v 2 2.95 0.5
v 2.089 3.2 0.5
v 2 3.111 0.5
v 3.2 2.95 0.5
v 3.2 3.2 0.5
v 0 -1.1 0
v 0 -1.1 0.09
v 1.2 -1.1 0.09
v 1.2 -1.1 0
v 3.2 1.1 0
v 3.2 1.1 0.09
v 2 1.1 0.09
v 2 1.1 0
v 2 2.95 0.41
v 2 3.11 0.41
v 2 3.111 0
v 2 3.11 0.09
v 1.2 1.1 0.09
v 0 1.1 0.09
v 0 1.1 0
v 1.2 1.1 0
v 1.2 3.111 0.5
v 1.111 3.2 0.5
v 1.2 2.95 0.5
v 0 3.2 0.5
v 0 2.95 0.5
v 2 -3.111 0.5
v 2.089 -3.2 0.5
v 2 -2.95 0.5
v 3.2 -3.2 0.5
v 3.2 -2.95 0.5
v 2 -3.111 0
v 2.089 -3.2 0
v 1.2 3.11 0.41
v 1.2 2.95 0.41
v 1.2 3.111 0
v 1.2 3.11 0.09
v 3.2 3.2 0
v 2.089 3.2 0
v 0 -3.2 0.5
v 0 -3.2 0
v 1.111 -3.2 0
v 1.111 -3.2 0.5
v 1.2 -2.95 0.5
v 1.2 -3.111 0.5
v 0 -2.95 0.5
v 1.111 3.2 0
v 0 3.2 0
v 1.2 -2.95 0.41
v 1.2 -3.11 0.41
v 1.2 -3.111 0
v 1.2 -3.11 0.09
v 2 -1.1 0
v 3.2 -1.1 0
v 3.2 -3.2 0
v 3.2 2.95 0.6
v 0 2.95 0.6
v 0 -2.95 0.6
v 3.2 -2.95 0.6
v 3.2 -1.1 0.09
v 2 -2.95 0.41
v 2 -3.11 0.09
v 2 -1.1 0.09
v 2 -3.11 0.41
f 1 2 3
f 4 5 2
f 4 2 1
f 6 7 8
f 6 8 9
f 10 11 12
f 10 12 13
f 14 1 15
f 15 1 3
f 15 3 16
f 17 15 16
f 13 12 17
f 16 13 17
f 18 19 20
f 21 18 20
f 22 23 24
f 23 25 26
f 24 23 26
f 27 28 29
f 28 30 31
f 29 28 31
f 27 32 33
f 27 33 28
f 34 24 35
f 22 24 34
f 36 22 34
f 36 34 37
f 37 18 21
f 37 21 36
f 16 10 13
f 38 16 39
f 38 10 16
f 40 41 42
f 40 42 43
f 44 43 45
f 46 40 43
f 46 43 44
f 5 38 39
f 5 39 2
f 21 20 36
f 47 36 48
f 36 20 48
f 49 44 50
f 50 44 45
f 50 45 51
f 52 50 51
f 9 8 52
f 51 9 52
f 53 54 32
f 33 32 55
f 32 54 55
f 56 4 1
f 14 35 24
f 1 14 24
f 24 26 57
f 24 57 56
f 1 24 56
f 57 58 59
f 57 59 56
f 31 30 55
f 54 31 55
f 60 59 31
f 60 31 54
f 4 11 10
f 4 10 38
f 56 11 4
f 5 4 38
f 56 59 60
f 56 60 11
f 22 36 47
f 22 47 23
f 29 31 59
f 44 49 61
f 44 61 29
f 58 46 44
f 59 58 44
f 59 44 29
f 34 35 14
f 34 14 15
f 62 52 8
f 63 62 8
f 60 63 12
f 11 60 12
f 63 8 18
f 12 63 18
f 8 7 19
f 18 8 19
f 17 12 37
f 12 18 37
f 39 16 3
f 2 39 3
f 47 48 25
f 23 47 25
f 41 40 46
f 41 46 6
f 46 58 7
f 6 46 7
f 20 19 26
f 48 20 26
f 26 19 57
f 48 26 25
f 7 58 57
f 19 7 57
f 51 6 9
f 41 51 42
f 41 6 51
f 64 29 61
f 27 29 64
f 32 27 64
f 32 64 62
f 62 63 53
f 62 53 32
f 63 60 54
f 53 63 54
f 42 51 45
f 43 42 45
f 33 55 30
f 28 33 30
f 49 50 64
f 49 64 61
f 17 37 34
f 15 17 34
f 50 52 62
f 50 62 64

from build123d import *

# Parameters (mm, degrees)
SKETCH001_W  = 5.9
SKETCH001_H  = 0.19
PAD001_DEPTH = 3.2
SKETCH_W     = 6.22
SKETCH_H     = 0.32
PAD_DEPTH    = 3.2
PAD002_DEPTH = 1.2
CHAMFER_SIZE = 0.089


with BuildPart() as body001:
    # Sketch001 → Pad001 (new body)
    with BuildSketch(Plane.YZ):
        with Locations((0, 0.505)):
            Rectangle(SKETCH001_W, SKETCH001_H)
    extrude(amount=PAD001_DEPTH)


with BuildPart() as fusion002:
    # Sketch → Pad (new body)
    with BuildSketch(Plane.YZ):
        with Locations((0, 0.25)):
            Rectangle(SKETCH_W, SKETCH_H)
    extrude(amount=PAD_DEPTH)

    # Fusion002: union Body001
    add(body001.part)


with BuildPart() as body002:
    # Sketch002 → Pad002 (new body)
    with BuildSketch(Plane.YZ):
        Polygon((-2.95, 0.41), (-3.11, 0.41), (-3.11, 0.09), (-1.1, 0.09), (-1.1, 0), (-3.2, 0), (-3.2, 0.5), (-2.95, 0.5), align=None)
    extrude(amount=PAD002_DEPTH)

    # Chamfer
    chamfer_edges = [body002.edges().sort_by_distance(p)[0] for p in [
        (1.2, -3.2, 0.25),
    ]]
    chamfer(chamfer_edges, length=CHAMFER_SIZE)


with BuildPart() as mirror_of_body002:
    # mirror: instance of Body002
    add(body002.part.mirror(Plane(origin=(1.6, 0, 0), x_dir=(0, -1, 0), z_dir=(1, 0, 0))))


with BuildPart() as fusion:
    # Fusion base: copy of Body002
    add(body002.part)

    # Fusion: union Mirror of Body002
    add(mirror_of_body002.part)


with BuildPart() as mirror_of_fusion:
    # mirror001: instance of Fusion
    add(fusion.part.mirror(Plane(origin=(0, 0, 0), x_dir=(1, 0, 0), z_dir=(0, 1, 0))))


with BuildPart() as lvk24:
    # Fusion001 base: copy of Fusion
    add(fusion.part)

    # Fusion001: union Mirror of Fusion
    add(mirror_of_fusion.part)

    # Fusion003: union Fusion002
    add(fusion002.part)


solid = lvk24.part
